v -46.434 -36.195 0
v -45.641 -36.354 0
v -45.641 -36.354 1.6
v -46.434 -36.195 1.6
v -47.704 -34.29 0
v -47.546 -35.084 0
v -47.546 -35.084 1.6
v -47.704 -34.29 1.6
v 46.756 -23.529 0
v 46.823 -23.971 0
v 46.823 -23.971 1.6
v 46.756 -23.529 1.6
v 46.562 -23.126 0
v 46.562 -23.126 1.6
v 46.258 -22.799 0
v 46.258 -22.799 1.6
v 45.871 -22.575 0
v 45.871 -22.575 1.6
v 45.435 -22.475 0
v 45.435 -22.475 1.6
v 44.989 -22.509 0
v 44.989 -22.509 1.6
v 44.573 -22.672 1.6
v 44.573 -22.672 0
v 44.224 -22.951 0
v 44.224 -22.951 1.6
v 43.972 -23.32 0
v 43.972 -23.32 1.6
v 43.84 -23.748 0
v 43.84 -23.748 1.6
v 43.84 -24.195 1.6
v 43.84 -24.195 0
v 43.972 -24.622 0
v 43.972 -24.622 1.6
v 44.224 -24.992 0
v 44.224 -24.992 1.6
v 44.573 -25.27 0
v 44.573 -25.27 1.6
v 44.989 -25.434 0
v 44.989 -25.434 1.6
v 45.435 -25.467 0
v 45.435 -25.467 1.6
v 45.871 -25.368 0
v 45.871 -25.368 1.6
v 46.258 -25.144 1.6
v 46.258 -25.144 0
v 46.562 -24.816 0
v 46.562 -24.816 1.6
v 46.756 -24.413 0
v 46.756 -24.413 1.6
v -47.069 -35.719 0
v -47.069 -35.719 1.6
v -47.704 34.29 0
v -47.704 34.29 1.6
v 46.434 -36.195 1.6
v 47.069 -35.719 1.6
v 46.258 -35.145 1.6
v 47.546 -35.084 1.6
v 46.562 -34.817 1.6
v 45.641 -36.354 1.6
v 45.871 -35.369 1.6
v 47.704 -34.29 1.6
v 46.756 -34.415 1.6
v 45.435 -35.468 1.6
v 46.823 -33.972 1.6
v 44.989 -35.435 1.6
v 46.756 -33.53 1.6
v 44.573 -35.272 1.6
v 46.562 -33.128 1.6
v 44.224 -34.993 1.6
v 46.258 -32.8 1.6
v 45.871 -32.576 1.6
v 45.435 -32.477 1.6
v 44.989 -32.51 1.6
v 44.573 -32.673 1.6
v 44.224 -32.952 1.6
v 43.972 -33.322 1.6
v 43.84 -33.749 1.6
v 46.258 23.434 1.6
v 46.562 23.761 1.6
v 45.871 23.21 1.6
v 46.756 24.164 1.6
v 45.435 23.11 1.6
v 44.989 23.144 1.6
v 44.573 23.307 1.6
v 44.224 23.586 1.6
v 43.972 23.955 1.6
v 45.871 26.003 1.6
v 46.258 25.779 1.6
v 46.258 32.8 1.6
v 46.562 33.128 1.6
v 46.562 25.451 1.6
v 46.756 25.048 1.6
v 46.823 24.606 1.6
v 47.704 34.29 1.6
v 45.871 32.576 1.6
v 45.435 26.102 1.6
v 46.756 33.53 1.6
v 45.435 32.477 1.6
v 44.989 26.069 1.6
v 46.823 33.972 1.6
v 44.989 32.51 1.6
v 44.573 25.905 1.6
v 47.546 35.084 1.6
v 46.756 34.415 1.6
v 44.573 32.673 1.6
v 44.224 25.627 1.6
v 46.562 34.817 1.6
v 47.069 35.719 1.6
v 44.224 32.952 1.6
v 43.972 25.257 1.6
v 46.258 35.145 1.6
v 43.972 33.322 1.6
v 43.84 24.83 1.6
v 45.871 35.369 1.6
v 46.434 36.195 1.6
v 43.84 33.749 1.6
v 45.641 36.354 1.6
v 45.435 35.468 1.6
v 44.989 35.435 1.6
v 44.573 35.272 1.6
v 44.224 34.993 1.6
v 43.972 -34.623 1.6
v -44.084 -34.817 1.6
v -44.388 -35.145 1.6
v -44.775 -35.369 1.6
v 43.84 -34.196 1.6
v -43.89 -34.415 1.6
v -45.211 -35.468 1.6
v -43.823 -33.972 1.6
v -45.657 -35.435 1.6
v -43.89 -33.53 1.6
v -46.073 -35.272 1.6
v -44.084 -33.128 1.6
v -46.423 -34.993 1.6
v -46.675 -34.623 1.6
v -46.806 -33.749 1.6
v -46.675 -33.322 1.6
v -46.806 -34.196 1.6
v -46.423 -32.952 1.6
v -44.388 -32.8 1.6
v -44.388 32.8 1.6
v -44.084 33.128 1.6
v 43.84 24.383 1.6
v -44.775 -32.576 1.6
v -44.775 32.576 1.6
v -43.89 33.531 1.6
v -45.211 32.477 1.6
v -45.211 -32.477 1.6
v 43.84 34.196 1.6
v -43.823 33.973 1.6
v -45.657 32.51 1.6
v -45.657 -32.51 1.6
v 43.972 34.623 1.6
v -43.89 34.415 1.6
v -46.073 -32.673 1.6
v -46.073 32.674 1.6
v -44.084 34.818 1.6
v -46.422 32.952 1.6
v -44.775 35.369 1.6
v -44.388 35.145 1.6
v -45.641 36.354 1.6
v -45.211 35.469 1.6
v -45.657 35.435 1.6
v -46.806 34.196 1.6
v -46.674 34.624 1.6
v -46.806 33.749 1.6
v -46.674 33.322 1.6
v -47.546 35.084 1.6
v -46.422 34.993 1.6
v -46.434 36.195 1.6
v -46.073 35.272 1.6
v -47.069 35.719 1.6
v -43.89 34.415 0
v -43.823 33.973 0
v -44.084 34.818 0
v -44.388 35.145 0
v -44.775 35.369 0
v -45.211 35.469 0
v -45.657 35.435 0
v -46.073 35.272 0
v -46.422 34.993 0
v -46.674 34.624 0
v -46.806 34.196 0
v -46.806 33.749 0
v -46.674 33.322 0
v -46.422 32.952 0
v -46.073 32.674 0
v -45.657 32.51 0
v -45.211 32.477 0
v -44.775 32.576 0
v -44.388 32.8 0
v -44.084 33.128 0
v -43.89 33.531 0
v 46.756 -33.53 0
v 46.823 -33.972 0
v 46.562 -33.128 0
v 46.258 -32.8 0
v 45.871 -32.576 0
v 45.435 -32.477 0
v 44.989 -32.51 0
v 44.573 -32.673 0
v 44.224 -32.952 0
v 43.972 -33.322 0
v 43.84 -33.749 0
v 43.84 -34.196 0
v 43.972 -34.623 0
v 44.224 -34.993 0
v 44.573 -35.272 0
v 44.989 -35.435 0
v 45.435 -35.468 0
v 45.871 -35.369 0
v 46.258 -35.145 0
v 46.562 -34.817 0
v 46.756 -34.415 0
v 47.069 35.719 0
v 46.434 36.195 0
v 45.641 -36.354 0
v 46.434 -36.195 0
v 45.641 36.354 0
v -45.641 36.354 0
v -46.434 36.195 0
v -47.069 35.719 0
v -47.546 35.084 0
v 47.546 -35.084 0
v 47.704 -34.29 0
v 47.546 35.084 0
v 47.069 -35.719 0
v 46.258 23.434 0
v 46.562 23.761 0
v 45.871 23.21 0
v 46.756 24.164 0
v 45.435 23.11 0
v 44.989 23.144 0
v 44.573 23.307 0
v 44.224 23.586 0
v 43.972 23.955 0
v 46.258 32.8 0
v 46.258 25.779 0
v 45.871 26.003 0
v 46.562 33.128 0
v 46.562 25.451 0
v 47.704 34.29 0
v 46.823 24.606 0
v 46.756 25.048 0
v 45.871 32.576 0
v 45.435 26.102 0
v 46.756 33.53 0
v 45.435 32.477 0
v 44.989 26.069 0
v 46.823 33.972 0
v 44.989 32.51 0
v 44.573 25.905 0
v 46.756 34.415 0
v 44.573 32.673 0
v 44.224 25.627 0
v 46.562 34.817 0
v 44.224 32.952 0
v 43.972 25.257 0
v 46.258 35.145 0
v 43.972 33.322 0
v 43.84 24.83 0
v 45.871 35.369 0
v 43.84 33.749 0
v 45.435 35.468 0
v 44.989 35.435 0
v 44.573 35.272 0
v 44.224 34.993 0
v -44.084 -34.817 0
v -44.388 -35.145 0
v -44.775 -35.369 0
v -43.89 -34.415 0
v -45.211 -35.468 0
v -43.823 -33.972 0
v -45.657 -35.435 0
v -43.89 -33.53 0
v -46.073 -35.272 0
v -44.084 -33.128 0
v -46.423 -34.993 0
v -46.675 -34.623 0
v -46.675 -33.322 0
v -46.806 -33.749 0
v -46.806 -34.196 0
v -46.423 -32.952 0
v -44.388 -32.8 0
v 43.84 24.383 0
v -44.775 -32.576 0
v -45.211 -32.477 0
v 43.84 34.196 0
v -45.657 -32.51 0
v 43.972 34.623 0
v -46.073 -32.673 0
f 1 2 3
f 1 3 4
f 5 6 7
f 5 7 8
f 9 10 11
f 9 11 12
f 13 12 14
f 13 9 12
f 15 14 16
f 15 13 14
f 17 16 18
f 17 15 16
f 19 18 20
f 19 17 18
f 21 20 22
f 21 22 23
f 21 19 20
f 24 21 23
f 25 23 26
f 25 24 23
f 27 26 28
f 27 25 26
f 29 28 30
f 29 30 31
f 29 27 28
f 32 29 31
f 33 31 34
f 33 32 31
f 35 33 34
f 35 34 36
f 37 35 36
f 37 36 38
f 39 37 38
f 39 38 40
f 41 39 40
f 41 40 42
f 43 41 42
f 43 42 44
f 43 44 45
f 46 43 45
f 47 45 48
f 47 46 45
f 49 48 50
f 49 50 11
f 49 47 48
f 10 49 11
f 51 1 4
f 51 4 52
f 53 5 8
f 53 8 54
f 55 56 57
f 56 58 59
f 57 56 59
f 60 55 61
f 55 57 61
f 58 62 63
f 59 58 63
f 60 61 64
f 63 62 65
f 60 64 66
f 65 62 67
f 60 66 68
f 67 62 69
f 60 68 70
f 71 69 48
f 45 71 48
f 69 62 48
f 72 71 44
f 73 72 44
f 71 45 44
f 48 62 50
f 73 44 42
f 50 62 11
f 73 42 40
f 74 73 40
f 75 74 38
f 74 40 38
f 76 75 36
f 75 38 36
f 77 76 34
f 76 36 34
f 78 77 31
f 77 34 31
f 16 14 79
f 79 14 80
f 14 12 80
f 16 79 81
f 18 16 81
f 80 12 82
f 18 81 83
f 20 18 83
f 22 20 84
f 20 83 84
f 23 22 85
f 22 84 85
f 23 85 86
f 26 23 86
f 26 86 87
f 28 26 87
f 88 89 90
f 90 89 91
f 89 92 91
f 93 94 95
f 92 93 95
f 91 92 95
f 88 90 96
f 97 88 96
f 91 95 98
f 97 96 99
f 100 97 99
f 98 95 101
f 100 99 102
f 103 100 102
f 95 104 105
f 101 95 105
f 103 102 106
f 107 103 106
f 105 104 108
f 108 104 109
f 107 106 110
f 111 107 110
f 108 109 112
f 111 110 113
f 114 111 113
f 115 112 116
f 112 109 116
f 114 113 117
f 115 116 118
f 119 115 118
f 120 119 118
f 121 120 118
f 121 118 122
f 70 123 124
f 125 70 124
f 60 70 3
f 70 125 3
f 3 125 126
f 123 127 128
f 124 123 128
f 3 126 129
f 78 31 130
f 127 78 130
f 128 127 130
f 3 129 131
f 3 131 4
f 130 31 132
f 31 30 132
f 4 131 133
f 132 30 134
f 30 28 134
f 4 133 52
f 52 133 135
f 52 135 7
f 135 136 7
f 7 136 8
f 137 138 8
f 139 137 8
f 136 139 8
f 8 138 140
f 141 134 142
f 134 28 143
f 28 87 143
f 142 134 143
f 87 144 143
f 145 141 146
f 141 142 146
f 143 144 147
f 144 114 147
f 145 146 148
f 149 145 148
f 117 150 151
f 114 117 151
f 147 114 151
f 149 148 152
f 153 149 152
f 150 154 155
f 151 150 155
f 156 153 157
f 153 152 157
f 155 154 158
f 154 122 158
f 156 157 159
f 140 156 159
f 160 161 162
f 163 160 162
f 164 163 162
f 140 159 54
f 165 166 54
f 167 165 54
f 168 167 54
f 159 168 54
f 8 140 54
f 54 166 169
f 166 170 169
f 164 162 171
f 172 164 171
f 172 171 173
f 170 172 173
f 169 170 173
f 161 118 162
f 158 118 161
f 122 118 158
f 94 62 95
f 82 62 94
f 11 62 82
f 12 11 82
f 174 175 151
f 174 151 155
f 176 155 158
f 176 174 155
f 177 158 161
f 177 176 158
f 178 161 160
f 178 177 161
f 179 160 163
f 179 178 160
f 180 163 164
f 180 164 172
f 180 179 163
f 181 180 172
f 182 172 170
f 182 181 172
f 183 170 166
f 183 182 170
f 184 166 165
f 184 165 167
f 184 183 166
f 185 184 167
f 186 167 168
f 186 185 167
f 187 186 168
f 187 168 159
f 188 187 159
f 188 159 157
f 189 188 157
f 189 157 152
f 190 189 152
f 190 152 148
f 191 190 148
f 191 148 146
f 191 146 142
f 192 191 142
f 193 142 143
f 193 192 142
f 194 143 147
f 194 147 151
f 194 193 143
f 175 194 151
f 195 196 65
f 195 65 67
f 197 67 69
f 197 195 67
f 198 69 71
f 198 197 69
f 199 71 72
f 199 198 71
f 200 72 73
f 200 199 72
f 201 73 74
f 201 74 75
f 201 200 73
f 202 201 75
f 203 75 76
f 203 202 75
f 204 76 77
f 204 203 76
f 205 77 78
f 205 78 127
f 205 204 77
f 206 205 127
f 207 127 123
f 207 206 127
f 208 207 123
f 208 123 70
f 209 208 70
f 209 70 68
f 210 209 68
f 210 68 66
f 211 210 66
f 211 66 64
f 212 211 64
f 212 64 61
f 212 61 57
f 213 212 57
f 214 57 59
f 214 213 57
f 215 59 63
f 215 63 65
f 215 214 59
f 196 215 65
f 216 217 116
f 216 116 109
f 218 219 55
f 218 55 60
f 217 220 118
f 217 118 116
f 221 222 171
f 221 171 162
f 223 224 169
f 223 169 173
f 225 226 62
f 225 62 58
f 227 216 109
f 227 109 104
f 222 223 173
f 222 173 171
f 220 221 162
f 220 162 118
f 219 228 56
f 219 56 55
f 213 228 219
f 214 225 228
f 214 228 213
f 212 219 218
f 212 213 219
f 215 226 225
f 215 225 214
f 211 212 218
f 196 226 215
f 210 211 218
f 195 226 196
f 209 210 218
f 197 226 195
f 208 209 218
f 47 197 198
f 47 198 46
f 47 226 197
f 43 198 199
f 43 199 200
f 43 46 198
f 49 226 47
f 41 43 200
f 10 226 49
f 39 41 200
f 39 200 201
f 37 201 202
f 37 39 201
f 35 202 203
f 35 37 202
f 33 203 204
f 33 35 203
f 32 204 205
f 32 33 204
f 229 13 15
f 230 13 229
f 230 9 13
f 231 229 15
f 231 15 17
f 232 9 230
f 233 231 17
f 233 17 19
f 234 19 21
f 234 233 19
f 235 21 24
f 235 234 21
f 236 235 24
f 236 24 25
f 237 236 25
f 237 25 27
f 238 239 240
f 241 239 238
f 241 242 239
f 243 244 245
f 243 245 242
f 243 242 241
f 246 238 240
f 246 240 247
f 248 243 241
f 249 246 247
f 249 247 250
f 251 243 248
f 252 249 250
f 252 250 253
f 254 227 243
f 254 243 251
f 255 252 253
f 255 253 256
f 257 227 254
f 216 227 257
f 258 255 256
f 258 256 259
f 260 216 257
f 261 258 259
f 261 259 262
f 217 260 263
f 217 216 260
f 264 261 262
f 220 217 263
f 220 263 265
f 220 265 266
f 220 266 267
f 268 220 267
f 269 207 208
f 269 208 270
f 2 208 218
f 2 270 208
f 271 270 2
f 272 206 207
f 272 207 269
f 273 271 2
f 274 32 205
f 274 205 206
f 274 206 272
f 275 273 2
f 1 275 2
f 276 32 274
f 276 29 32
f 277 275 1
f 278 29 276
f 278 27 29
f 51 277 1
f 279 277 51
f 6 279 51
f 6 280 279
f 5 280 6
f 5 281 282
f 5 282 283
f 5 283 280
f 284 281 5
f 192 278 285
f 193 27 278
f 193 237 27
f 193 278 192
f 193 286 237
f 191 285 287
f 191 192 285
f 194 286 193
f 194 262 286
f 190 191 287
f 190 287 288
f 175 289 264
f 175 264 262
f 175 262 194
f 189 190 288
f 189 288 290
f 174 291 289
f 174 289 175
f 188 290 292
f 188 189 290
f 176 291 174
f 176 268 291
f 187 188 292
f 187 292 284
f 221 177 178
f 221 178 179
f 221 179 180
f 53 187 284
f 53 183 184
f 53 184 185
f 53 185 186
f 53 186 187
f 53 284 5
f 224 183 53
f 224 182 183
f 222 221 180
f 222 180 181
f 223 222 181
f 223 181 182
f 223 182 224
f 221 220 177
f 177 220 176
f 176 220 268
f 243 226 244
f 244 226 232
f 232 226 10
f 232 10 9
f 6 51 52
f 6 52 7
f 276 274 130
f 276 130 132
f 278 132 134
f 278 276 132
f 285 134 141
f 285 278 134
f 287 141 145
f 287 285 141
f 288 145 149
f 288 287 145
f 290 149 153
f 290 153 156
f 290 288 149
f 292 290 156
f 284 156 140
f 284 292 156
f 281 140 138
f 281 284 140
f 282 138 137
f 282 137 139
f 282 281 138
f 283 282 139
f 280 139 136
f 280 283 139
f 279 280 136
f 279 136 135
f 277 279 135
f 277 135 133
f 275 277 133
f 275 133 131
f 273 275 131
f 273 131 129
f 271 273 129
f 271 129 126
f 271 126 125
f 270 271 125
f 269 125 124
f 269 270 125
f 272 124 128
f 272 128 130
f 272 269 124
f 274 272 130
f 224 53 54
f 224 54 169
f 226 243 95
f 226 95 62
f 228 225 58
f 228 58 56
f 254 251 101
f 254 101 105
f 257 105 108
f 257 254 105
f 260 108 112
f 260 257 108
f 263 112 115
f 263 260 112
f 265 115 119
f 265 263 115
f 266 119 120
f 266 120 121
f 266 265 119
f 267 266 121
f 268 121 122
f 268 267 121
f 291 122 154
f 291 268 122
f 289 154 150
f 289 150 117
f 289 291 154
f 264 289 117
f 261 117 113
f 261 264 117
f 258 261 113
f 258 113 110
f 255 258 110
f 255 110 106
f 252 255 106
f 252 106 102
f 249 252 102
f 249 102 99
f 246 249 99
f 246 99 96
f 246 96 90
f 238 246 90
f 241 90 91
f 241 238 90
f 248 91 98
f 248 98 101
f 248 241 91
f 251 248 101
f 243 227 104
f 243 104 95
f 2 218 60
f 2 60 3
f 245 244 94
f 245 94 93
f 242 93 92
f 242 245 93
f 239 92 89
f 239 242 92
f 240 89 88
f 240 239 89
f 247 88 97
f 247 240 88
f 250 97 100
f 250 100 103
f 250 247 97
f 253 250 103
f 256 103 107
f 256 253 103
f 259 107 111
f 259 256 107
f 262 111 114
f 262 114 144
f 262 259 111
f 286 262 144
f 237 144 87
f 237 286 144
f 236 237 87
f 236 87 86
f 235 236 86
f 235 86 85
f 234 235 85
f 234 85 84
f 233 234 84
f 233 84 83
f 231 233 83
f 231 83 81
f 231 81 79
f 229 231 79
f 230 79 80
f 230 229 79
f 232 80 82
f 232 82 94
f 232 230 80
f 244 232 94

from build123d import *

# Parameters (mm, degrees)
SKETCH_1_R      = 1.5
EXTRUDE_1_DEPTH = 1.6


with BuildPart() as part:
    # Эскиз1 → Бобышка-Вытянуть1 (new body)
    with BuildSketch(Plane.XY):
        Polygon((45.640633333, -36.353733333), (-45.640633333, -36.353733333), (-46.434366667, -36.195), (-47.069366667, -35.718733333), (-47.545633333, -35.083733333), (-47.704366667, -34.29), (-47.704366667, 34.29), (-47.545633333, 35.083733333), (-47.069366667, 35.718733333), (-46.434366667, 36.195), (-45.640633333, 36.353733333), (45.640633333, 36.353733333), (46.434366667, 36.195), (47.069366667, 35.718733333), (47.545633333, 35.083733333), (47.704366667, 34.29), (47.704366667, -34.29), (47.545633333, -35.083733333), (47.069366667, -35.718733333), (46.434366667, -36.195), align=None)
        with Locations((-45.323133333, -33.9725)):
            Circle(SKETCH_1_R, mode=Mode.SUBTRACT)
        with Locations((-45.322866667, 33.972733333)):
            Circle(SKETCH_1_R, mode=Mode.SUBTRACT)
        with Locations((45.3231, 33.9725)):
            Circle(SKETCH_1_R, mode=Mode.SUBTRACT)
        with Locations((45.323133333, 24.606266667)):
            Circle(SKETCH_1_R, mode=Mode.SUBTRACT)
        with Locations((45.3231, -33.9725)):
            Circle(SKETCH_1_R, mode=Mode.SUBTRACT)
        with Locations((45.3231, -23.971266667)):
            Circle(SKETCH_1_R, mode=Mode.SUBTRACT)
    extrude(amount=EXTRUDE_1_DEPTH)


solid = part.part
